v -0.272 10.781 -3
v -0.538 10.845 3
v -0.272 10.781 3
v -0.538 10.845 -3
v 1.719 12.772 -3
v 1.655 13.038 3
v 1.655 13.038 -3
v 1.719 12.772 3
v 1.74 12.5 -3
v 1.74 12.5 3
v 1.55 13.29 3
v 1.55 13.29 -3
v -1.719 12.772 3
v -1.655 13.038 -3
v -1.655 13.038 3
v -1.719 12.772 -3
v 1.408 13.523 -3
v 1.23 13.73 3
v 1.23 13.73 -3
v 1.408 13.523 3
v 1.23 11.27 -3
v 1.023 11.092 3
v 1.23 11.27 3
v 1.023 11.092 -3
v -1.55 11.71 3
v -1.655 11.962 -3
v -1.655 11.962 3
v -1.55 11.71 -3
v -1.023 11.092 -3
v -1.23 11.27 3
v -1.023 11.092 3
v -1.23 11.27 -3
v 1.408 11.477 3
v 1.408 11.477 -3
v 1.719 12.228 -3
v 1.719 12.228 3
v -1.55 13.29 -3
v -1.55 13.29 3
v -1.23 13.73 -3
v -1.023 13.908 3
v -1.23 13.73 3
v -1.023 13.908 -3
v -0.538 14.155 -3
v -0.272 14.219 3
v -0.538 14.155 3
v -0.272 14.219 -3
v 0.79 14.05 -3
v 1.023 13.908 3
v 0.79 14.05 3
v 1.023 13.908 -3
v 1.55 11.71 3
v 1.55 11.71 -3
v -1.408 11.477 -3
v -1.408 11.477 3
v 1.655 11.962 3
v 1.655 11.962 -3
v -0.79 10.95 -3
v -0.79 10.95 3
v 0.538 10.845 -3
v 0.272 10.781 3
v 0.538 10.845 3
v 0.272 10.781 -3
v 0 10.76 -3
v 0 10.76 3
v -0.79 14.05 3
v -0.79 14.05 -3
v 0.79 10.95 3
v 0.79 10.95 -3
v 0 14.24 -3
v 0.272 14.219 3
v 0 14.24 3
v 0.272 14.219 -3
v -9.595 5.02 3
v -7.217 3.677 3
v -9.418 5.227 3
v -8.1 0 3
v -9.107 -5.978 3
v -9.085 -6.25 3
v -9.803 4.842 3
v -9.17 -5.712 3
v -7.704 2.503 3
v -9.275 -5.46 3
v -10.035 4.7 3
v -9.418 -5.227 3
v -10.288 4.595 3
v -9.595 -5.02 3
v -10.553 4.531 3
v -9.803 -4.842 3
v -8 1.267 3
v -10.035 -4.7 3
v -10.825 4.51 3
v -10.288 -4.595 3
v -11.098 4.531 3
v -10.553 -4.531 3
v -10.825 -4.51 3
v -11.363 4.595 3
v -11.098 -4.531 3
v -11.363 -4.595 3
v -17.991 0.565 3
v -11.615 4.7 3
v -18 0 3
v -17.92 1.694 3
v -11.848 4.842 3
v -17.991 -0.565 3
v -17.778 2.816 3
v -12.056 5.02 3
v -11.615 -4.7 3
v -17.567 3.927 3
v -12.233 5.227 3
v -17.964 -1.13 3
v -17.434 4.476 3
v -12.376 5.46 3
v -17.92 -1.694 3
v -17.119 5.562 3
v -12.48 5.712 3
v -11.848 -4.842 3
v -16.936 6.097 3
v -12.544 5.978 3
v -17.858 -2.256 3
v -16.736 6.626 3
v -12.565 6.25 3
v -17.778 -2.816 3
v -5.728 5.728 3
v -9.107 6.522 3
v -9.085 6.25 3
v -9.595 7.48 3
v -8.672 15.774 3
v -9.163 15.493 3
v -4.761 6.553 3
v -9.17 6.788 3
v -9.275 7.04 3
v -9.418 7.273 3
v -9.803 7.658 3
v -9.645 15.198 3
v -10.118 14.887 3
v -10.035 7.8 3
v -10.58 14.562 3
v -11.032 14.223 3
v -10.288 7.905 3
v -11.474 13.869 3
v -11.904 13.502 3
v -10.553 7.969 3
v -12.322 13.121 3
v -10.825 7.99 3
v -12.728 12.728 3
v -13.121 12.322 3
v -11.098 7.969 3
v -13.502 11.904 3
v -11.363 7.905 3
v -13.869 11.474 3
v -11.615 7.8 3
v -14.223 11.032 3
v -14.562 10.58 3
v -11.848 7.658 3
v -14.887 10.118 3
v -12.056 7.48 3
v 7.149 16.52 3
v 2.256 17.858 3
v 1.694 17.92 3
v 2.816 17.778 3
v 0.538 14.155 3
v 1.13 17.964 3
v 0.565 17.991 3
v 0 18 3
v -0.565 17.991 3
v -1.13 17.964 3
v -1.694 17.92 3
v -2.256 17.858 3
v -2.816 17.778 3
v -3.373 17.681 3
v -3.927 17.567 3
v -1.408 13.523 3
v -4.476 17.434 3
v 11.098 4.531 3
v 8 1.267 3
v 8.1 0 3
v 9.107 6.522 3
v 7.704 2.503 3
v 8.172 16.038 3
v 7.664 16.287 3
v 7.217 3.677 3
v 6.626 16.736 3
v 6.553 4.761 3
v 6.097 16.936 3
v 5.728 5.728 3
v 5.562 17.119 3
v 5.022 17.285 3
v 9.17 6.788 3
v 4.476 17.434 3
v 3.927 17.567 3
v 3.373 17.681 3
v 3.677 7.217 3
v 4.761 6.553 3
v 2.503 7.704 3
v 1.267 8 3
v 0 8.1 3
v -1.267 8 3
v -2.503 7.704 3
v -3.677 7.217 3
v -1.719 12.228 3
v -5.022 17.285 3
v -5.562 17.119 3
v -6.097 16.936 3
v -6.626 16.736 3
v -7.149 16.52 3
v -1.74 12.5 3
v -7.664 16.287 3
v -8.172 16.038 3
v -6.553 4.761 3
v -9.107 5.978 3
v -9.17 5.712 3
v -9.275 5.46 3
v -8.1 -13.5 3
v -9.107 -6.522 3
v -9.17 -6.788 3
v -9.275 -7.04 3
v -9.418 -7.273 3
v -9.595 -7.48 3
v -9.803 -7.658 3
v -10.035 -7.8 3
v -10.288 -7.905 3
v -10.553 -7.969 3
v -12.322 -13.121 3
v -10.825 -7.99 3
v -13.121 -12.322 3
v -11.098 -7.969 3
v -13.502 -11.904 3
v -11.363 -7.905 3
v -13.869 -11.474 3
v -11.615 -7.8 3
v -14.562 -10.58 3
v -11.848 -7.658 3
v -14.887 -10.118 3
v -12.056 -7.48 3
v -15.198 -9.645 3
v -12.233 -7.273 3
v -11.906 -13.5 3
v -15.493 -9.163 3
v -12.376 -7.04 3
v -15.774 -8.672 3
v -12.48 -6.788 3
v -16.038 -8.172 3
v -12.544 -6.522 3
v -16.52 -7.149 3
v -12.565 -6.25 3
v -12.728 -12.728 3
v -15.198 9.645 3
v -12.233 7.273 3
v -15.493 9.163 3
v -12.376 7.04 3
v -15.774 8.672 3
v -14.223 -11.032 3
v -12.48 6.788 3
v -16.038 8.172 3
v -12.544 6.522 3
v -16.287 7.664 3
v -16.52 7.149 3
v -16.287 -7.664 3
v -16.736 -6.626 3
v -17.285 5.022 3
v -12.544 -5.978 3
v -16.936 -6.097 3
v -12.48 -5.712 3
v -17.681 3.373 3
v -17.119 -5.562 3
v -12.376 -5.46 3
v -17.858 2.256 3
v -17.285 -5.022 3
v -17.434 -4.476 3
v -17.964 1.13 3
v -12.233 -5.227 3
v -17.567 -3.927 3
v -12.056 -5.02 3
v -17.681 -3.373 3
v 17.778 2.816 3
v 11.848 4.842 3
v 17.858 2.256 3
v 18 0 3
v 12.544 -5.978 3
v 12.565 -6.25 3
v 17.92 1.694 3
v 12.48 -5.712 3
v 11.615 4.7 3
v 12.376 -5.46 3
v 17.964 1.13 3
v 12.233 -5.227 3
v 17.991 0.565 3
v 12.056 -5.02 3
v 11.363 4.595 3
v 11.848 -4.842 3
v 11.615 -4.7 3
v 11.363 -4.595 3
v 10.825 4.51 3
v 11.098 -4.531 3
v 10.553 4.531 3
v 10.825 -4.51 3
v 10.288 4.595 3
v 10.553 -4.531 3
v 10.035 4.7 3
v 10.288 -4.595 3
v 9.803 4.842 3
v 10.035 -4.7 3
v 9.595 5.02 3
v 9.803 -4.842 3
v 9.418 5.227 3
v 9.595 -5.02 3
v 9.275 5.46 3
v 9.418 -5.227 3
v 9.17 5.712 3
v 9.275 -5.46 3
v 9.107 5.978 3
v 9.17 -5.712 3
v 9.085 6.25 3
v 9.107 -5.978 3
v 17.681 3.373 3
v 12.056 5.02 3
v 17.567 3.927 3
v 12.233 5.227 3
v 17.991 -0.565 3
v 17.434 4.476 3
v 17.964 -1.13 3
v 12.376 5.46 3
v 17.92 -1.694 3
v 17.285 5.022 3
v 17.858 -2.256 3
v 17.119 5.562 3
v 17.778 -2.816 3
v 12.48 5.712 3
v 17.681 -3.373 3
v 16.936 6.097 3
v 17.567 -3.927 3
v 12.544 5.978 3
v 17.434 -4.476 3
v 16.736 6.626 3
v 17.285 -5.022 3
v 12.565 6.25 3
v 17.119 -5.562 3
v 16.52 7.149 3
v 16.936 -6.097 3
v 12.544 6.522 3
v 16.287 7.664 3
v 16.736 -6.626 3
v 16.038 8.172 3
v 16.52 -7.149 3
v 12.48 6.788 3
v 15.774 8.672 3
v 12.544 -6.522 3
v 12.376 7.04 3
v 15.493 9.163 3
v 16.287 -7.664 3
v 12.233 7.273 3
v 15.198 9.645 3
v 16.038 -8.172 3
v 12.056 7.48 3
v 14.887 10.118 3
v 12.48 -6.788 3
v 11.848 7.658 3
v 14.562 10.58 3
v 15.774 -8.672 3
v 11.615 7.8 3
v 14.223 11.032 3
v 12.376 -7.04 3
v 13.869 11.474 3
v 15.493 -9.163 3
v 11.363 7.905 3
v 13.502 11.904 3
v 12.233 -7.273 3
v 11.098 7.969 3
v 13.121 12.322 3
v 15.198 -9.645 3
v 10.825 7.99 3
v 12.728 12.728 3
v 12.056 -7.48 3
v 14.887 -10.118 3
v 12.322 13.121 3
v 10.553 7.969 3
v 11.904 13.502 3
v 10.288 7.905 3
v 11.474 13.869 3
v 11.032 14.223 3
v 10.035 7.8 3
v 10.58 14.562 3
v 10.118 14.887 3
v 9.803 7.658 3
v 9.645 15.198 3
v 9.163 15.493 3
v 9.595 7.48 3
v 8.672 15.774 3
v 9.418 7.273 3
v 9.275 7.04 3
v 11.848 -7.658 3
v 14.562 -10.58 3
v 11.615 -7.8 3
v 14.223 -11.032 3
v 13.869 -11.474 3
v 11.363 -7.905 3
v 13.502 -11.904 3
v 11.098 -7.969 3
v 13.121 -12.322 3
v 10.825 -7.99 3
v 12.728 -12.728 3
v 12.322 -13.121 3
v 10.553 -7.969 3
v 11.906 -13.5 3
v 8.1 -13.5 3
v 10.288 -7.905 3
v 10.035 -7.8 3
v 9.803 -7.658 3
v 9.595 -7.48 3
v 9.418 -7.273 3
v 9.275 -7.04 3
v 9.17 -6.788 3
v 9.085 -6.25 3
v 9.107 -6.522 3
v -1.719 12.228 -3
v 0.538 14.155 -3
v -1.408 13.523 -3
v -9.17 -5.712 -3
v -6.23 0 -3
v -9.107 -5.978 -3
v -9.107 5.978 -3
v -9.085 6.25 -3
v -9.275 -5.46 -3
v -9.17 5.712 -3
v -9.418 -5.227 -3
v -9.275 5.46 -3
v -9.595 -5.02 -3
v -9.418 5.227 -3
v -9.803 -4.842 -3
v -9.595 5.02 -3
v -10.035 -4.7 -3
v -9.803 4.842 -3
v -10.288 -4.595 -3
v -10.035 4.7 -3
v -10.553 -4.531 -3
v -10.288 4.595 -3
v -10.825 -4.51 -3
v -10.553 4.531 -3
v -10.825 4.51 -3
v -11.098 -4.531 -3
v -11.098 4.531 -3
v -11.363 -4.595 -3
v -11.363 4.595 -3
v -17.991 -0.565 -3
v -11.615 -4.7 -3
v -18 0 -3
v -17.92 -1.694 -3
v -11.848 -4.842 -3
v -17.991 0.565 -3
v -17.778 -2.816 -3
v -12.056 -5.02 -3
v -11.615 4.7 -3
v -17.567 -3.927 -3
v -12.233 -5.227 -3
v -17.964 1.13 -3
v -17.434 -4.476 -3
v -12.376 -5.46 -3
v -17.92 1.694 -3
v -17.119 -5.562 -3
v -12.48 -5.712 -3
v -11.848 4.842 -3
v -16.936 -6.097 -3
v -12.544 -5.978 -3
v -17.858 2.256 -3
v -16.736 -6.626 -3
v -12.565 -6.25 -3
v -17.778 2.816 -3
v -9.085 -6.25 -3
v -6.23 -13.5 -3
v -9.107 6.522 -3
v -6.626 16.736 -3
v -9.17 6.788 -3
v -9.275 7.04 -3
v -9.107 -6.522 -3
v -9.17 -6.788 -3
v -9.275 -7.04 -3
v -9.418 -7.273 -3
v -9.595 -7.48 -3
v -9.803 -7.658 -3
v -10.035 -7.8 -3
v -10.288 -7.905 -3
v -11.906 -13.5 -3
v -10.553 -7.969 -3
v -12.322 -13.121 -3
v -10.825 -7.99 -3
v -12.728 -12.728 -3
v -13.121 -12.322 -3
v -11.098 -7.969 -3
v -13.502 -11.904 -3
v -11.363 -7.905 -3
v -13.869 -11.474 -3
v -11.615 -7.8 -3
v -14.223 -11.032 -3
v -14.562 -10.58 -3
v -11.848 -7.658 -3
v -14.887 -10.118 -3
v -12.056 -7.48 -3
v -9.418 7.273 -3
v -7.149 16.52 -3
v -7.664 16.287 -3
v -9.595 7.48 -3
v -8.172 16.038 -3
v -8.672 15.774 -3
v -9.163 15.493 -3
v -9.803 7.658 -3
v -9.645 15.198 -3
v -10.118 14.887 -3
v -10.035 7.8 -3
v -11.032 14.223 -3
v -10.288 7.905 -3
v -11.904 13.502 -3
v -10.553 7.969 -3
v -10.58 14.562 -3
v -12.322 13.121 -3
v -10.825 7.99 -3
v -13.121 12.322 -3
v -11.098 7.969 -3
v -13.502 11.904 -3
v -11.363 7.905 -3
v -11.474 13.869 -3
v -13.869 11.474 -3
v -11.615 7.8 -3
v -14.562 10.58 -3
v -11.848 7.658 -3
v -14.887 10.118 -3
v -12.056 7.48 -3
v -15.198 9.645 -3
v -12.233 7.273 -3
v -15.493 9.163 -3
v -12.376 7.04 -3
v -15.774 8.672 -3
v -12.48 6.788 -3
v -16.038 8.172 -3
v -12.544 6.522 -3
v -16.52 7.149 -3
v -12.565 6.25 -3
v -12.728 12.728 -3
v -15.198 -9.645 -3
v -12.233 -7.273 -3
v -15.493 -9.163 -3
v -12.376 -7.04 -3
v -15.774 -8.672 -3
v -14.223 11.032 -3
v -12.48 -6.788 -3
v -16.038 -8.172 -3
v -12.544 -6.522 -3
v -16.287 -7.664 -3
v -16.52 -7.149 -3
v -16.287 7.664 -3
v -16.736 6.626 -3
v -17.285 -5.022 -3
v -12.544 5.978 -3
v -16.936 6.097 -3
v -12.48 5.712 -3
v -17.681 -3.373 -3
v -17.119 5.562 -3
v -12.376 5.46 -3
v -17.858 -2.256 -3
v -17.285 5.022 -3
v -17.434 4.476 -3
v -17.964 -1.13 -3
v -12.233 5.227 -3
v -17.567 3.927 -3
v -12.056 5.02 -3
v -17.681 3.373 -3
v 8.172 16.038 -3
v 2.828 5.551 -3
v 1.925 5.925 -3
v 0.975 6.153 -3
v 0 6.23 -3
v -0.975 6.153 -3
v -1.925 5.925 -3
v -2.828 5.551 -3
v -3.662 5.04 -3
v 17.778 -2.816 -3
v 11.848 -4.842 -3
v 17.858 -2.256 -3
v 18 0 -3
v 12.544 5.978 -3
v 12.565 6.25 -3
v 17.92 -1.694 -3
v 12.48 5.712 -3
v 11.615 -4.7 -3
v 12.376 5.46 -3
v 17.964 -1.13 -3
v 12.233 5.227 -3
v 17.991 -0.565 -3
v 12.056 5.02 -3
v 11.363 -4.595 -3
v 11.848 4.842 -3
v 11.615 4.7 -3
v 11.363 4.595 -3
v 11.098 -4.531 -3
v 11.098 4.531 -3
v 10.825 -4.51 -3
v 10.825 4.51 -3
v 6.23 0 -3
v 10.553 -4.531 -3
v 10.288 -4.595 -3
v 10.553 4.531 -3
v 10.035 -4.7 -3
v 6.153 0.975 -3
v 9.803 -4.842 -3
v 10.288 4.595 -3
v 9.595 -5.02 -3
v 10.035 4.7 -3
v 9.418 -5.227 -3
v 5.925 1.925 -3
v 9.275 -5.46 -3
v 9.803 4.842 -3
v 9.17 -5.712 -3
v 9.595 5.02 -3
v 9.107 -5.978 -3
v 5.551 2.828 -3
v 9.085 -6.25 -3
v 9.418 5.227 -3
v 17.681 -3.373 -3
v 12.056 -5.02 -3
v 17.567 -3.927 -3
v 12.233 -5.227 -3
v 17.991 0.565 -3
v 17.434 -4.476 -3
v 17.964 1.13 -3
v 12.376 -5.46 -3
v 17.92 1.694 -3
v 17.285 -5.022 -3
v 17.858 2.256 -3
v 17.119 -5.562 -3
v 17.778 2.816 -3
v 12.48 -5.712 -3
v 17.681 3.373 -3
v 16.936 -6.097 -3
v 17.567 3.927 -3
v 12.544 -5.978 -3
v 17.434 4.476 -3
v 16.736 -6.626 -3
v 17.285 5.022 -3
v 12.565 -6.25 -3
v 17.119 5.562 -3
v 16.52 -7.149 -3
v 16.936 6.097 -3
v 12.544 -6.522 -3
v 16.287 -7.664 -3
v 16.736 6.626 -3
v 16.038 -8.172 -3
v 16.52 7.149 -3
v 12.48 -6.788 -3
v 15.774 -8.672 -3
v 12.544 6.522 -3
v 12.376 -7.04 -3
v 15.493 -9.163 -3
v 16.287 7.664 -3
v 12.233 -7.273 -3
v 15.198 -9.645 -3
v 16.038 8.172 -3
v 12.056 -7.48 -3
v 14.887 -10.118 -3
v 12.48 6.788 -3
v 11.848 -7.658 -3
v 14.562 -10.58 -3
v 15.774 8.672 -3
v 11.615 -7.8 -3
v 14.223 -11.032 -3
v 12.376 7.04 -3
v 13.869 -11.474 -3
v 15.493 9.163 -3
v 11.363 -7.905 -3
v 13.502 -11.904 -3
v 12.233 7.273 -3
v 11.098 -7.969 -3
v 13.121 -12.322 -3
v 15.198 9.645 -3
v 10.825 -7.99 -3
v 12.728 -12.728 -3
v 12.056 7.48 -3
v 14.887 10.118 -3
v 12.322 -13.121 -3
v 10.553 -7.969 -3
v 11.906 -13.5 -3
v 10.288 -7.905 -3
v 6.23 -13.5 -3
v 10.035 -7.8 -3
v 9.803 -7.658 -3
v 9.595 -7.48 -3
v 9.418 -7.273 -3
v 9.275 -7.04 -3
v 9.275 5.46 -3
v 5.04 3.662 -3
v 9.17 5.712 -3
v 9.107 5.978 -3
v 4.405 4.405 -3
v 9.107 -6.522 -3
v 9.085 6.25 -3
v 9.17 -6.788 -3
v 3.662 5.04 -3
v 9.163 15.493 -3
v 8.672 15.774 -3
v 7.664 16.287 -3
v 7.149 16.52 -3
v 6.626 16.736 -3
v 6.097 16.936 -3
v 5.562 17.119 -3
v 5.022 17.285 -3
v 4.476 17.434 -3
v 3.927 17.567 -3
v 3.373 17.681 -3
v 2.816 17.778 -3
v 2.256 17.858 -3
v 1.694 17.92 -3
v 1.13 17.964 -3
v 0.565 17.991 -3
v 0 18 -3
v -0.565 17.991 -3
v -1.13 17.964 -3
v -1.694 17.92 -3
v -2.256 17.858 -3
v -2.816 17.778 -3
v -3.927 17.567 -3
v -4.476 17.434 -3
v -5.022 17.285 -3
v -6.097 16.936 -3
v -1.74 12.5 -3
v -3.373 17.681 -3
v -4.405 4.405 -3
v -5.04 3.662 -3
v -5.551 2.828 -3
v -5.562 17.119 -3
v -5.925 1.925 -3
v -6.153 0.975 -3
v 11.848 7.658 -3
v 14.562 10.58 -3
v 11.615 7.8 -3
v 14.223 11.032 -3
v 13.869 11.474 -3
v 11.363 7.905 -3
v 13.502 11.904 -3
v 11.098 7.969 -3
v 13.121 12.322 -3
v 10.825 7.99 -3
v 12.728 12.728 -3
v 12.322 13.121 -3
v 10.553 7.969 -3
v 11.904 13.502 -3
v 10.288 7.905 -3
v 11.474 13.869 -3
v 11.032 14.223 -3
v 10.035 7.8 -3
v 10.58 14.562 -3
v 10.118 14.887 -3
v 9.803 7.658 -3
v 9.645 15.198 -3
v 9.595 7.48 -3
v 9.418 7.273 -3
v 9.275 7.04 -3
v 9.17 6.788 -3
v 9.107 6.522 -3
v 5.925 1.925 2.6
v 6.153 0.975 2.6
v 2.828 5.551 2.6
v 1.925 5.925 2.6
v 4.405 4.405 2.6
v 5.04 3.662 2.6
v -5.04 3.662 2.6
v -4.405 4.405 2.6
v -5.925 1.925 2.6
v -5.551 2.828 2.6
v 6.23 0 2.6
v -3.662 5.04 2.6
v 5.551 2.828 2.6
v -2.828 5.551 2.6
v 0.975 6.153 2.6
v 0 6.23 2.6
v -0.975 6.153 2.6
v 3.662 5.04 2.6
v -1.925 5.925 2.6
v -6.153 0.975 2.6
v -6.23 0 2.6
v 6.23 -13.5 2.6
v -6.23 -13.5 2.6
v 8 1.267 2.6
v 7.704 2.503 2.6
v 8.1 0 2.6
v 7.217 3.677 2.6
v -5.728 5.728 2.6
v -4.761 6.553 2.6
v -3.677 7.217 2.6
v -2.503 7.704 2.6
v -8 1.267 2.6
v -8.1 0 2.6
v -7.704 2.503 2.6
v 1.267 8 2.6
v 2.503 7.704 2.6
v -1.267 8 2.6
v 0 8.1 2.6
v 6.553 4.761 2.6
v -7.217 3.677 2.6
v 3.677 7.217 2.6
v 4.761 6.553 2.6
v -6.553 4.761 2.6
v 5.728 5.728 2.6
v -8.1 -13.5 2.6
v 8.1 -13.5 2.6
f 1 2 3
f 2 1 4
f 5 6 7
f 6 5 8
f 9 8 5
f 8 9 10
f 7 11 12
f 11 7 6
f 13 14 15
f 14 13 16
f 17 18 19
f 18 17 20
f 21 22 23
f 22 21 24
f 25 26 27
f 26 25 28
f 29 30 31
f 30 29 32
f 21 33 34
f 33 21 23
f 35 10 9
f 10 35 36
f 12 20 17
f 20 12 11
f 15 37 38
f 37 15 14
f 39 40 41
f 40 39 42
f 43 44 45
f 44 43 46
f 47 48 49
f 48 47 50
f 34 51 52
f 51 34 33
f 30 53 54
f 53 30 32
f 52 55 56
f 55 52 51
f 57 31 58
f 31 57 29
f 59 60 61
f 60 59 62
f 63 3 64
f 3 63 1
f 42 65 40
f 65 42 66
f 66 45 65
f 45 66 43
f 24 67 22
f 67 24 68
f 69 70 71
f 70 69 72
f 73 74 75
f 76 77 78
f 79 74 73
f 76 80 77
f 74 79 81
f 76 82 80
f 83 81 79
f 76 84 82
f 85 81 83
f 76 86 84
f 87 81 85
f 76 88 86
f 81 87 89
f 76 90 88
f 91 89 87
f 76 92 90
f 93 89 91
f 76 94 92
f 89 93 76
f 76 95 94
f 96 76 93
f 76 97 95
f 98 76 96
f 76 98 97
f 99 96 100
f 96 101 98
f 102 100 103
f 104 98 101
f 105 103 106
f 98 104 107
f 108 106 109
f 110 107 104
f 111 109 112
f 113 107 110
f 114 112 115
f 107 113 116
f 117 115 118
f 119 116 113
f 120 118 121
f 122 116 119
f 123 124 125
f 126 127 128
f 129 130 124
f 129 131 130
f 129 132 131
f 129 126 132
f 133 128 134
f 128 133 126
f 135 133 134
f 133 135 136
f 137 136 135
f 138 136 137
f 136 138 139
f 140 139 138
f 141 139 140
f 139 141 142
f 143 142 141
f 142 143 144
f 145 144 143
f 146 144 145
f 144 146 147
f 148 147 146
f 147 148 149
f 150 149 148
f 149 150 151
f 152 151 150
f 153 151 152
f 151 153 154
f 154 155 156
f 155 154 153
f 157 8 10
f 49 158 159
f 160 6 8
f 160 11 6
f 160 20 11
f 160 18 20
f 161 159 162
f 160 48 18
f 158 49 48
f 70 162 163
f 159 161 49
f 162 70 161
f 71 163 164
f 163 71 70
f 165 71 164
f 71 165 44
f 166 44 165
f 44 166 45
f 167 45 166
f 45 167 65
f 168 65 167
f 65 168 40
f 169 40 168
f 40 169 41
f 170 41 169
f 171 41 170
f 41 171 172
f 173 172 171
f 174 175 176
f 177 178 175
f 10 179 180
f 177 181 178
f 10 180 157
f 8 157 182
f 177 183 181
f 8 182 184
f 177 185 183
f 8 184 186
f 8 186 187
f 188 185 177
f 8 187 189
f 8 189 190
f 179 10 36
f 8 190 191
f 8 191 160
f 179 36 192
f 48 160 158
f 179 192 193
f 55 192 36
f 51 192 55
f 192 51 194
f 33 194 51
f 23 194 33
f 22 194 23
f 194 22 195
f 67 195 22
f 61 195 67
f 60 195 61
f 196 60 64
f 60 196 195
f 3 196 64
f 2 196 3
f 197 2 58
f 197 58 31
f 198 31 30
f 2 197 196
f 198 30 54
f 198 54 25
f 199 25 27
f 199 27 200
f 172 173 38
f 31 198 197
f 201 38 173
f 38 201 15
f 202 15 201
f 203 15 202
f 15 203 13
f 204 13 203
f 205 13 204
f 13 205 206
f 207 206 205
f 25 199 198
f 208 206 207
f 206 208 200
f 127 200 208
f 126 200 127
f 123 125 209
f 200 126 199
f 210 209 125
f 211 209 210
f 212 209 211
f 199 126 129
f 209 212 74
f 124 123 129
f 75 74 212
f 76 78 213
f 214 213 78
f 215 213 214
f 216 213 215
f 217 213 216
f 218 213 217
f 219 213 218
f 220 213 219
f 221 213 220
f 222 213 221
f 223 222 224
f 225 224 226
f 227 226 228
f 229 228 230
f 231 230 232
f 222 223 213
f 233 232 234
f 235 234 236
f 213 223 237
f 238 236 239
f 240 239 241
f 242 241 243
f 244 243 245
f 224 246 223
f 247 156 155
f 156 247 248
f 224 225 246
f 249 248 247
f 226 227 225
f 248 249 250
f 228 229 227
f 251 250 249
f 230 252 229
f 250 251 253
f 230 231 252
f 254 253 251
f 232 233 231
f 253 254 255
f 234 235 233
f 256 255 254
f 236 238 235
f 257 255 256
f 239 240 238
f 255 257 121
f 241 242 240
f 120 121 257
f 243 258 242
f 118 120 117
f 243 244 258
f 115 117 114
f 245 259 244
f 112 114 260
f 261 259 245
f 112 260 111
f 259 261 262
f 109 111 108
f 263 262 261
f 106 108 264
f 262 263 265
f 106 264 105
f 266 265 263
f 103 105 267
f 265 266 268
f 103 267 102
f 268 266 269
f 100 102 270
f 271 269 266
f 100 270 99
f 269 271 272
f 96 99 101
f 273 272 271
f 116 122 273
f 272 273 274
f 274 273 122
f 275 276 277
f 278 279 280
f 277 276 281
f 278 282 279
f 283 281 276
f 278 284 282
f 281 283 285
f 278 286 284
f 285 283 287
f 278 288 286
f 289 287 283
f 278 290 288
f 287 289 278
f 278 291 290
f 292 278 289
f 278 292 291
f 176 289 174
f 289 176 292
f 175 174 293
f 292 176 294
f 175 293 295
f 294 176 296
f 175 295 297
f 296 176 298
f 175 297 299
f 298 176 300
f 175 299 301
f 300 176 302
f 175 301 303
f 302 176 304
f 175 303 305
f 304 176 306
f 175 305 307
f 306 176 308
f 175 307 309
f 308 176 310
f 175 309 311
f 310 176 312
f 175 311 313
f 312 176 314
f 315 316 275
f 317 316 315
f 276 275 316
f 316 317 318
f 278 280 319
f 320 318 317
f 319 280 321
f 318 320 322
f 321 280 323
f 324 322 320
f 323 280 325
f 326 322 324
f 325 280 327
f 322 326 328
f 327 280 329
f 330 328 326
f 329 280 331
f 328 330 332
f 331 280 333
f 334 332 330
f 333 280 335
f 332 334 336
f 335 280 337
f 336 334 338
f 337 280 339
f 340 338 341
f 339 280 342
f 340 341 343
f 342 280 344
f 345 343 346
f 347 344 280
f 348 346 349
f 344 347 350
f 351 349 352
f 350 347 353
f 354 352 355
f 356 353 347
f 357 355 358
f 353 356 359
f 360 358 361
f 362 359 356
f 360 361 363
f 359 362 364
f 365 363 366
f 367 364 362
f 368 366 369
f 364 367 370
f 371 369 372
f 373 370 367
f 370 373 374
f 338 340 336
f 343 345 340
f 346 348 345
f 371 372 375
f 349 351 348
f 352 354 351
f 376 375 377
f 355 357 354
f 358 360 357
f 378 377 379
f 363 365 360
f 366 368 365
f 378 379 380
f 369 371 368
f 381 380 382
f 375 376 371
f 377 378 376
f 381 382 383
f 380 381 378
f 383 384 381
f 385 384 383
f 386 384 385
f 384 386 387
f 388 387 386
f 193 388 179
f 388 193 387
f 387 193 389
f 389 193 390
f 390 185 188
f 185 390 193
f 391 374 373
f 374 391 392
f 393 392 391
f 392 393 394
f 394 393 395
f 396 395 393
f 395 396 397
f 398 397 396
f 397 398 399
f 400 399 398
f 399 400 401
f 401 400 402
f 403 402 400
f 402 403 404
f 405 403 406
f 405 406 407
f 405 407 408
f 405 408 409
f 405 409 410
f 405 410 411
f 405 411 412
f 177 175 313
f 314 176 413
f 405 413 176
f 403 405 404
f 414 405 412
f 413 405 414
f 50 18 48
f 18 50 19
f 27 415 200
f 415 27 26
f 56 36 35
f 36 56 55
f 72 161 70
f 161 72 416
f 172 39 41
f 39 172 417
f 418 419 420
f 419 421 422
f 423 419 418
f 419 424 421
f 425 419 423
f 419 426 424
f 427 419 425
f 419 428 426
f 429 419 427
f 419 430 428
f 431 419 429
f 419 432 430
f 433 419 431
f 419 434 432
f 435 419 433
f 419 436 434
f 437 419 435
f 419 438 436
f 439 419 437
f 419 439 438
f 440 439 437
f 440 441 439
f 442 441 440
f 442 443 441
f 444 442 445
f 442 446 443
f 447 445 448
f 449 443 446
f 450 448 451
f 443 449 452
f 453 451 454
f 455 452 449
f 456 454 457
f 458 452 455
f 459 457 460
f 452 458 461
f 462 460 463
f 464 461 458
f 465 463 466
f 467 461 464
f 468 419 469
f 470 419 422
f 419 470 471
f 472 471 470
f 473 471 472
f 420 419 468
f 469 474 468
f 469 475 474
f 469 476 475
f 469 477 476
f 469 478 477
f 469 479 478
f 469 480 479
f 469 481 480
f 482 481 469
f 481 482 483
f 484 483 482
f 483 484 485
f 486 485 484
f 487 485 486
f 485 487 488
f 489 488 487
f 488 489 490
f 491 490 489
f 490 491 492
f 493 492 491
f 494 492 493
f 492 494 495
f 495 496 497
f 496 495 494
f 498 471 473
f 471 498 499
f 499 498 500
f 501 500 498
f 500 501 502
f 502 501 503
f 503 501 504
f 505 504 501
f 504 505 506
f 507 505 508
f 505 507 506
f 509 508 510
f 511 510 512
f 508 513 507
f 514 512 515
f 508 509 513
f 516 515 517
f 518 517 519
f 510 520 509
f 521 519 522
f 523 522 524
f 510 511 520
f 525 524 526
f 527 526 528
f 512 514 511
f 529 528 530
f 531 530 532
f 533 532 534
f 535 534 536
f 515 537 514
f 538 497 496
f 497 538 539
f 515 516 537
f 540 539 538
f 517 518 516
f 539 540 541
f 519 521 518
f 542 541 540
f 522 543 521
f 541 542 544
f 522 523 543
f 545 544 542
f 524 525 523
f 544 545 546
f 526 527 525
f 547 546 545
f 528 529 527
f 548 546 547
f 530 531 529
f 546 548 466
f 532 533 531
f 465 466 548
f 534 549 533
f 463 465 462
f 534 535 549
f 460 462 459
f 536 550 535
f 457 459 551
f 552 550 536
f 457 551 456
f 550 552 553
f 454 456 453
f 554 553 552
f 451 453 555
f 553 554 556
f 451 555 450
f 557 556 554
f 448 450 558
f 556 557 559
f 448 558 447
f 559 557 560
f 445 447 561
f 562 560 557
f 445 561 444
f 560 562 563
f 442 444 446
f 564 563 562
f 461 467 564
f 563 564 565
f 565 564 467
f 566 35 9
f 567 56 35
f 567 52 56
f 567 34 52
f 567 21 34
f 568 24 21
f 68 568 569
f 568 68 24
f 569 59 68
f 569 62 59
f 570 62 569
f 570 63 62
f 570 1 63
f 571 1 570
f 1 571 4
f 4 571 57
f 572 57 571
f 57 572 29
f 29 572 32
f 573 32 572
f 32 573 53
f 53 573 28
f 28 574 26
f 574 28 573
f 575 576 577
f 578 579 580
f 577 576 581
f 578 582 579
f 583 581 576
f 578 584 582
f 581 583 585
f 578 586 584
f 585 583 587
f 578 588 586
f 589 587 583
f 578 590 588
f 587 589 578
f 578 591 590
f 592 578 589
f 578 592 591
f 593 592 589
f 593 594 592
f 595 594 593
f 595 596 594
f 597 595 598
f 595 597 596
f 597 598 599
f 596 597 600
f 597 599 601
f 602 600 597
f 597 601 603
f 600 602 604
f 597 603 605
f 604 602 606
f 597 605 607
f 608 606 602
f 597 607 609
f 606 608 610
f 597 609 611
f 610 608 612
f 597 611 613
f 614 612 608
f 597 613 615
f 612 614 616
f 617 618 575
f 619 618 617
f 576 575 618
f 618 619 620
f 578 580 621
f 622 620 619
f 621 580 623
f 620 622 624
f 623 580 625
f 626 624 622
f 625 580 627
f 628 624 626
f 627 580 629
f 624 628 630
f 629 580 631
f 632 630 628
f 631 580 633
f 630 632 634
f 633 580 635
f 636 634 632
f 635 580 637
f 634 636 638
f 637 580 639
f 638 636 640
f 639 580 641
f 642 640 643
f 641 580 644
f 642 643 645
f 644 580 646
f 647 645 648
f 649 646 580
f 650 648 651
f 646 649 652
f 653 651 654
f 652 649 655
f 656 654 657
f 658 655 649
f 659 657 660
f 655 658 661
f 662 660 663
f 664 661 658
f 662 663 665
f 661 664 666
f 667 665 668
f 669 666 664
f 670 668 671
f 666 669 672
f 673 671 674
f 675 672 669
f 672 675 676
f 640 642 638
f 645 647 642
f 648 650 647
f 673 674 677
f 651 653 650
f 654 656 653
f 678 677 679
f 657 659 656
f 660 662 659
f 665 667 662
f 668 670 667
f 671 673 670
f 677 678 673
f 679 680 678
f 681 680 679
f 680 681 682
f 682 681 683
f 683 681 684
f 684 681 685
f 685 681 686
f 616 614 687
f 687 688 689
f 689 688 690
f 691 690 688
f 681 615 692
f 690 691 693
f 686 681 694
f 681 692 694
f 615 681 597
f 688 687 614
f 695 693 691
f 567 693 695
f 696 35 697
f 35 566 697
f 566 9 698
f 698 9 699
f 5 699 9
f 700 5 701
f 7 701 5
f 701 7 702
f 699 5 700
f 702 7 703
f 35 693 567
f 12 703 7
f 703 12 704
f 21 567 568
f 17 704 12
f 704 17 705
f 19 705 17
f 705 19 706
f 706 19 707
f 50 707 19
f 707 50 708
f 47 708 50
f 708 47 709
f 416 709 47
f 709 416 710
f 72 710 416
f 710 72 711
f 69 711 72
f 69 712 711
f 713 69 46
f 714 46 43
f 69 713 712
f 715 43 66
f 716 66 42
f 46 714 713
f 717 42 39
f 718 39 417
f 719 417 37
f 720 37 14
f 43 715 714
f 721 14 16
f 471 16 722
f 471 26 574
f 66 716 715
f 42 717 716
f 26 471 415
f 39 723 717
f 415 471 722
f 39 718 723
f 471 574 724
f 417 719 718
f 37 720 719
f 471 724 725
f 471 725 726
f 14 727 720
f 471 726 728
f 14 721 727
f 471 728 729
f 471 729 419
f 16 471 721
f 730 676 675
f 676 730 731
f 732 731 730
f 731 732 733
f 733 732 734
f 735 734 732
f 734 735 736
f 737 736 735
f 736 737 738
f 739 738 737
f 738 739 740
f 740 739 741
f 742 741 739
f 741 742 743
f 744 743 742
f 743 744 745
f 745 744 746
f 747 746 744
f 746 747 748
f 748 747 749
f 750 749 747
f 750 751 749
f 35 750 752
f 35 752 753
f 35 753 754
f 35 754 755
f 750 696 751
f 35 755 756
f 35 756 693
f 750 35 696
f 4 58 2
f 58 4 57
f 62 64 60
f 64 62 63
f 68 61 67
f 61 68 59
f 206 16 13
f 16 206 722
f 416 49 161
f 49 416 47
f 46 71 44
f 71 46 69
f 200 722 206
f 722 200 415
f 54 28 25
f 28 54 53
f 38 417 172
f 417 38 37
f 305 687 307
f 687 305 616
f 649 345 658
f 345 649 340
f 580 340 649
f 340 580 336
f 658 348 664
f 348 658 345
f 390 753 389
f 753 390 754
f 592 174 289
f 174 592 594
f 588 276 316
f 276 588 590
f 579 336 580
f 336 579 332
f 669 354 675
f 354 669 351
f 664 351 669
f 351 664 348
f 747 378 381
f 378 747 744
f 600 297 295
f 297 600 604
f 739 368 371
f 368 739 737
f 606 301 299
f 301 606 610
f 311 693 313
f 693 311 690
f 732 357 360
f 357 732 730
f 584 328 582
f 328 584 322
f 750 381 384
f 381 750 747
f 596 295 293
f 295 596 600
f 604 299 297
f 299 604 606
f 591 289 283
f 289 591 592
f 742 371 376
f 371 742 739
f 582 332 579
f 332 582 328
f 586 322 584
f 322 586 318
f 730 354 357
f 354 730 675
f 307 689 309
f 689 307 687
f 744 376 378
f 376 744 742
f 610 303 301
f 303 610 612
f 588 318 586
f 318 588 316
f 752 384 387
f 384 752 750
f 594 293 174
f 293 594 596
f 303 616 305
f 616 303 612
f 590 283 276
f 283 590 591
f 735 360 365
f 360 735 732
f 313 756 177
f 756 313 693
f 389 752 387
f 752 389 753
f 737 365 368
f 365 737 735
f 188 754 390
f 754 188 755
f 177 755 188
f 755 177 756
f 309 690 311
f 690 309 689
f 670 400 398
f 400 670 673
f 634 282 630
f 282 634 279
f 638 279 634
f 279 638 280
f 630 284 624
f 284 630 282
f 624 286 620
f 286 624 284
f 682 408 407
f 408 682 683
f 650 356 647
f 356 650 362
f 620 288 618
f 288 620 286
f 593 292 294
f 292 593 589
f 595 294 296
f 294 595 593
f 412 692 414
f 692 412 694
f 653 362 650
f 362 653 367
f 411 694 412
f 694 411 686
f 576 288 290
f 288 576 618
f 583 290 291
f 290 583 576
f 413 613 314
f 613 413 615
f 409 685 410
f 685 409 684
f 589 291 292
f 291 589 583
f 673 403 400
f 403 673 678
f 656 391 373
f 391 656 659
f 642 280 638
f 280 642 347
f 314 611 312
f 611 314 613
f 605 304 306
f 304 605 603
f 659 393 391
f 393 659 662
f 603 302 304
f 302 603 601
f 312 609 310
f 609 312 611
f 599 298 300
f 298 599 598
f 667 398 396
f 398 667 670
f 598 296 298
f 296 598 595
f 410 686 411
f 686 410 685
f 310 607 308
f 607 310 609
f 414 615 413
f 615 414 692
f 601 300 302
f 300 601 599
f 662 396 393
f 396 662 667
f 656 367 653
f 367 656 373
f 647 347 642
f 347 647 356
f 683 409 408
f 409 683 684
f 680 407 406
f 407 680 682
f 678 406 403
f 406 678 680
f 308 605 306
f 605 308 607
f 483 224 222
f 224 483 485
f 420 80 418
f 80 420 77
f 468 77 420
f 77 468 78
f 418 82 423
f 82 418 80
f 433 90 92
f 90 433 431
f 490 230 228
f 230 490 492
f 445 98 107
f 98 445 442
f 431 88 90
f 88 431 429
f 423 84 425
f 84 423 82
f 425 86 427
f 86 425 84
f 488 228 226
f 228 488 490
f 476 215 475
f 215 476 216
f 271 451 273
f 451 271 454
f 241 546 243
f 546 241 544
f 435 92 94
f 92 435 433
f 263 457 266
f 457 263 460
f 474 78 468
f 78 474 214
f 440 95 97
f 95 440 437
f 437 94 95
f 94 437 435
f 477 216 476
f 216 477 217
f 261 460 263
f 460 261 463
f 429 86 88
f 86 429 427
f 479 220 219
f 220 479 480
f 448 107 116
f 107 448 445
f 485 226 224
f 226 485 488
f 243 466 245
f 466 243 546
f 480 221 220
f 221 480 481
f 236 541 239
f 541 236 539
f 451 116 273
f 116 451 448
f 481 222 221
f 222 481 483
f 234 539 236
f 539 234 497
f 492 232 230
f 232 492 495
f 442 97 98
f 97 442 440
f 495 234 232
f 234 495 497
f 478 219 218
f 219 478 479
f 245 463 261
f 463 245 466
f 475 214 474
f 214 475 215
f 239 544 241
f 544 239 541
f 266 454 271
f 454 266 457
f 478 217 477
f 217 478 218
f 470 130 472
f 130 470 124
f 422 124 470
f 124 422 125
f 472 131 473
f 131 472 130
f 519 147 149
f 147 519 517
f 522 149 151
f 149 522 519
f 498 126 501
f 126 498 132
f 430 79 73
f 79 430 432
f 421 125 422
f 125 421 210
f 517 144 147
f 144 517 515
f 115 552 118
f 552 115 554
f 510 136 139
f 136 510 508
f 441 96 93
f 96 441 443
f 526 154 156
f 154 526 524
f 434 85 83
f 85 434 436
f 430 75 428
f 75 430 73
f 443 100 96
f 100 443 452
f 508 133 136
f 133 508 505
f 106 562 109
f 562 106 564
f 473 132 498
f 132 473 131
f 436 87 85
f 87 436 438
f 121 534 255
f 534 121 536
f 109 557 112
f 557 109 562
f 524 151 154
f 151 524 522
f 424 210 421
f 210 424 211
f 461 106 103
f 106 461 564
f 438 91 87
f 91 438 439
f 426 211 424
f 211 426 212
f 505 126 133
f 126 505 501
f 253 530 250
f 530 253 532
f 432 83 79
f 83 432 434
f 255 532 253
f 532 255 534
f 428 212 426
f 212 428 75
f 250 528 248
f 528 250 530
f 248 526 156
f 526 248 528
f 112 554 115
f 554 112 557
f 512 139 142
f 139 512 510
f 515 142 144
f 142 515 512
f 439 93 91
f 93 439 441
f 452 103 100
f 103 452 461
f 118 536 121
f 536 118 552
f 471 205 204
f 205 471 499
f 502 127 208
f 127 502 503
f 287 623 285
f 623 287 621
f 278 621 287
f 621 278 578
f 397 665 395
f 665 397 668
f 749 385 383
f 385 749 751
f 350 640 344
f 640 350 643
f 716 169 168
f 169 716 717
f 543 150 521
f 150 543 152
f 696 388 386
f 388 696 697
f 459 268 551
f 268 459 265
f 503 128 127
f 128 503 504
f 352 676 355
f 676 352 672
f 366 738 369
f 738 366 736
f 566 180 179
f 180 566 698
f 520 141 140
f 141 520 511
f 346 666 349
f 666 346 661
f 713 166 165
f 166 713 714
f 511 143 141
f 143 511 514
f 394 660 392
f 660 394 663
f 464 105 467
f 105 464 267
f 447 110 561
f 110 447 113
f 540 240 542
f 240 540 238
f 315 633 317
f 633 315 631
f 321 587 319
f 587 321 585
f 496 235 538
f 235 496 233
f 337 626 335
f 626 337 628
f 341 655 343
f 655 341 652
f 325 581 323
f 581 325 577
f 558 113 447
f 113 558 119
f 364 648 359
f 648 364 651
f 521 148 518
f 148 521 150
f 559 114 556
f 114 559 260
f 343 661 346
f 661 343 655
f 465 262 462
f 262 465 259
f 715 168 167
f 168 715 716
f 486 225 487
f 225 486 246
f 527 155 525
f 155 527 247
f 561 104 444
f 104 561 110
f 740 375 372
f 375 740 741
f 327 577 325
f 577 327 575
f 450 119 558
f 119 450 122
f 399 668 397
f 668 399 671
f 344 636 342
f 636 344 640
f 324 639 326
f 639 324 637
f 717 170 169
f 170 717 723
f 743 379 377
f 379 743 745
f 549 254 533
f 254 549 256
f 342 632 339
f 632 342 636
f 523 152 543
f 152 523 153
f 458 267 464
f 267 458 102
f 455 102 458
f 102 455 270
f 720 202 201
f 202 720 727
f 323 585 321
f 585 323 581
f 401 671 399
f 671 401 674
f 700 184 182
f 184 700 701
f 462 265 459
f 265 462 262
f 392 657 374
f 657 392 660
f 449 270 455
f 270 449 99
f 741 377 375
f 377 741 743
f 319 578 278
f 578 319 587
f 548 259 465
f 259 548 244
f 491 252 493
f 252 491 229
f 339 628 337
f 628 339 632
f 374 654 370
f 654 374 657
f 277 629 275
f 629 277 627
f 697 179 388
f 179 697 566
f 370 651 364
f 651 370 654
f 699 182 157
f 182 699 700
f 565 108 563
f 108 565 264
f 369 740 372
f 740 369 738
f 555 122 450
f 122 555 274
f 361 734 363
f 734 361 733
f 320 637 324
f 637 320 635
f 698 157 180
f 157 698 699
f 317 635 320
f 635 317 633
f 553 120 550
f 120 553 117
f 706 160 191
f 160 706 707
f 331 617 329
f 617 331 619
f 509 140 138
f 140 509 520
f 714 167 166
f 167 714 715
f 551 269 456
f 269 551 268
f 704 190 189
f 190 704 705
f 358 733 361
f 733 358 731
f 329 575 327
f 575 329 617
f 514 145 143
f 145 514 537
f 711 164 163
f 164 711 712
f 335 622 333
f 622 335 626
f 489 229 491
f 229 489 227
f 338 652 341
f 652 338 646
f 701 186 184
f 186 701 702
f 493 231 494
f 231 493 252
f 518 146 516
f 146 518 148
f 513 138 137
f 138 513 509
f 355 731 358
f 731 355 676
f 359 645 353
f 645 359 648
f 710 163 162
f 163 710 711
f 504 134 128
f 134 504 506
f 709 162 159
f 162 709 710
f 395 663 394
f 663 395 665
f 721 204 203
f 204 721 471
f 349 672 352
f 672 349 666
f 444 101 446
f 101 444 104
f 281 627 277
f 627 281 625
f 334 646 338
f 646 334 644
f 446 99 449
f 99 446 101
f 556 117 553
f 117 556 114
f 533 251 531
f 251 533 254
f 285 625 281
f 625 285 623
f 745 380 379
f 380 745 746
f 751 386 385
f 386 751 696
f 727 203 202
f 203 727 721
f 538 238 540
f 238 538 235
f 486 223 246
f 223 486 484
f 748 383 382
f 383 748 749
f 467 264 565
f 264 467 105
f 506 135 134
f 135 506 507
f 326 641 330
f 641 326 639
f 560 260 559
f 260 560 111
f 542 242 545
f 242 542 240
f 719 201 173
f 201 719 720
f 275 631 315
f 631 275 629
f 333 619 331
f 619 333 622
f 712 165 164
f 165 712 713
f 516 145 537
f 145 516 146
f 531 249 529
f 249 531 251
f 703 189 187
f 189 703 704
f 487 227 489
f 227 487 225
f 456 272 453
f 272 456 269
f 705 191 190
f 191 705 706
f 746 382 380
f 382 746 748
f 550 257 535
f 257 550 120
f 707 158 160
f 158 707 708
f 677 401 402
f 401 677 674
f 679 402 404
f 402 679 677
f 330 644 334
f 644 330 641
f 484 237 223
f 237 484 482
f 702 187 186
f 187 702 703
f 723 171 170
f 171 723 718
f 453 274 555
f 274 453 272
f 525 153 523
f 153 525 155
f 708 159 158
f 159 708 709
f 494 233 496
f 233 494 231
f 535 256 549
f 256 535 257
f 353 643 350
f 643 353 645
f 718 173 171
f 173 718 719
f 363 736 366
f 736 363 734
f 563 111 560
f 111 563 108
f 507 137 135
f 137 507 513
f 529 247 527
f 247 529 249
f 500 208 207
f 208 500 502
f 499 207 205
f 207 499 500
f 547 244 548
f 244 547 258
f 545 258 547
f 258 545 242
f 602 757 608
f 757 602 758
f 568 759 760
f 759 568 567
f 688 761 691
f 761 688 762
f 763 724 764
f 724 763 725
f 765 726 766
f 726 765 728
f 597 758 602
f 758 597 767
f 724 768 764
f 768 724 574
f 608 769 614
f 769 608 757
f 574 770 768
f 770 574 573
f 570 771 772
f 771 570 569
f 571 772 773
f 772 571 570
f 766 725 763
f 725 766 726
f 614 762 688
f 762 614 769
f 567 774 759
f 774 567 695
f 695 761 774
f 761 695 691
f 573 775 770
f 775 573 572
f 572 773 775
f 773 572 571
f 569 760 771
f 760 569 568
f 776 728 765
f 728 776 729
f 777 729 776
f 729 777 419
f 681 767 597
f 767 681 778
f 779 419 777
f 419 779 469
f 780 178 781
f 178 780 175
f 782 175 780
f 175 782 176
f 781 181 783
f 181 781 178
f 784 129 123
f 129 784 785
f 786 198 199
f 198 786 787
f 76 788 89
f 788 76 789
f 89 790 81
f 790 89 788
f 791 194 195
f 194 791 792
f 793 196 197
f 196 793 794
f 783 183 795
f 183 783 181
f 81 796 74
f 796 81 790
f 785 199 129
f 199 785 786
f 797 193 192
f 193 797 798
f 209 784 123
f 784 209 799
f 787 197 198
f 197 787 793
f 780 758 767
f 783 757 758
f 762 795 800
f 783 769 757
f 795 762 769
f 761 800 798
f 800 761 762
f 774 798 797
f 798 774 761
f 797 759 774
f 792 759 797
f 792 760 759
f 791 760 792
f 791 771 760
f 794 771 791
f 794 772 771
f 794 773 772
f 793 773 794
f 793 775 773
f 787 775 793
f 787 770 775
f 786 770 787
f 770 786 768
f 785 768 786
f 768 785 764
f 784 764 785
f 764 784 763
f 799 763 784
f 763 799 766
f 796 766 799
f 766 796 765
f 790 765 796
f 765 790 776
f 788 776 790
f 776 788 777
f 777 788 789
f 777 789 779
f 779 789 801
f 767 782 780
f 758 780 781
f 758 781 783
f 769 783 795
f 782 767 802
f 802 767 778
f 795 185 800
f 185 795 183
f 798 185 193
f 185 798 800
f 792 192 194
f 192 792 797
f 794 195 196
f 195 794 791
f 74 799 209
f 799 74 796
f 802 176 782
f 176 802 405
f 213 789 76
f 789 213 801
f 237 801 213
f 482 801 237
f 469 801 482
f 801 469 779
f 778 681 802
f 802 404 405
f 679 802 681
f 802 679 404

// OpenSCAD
// file: configuration.scad
// Increase this if your slicer or printer make holes too tight.
extra_radius = 0.1;

// OD = outside diameter, corner to corner.
m3_nut_od = 6.1;
m3_nut_radius = m3_nut_od/2 + 0.2 + extra_radius;
m3_washer_radius = 3.5 + extra_radius;
m3_washer_height = 0.65;

// Major diameter of metric 3mm thread.
m3_head_height = 3;
m3_major = 2.88;
m3_radius = m3_major/2 + extra_radius;
m3_wide_radius = m3_major/2 + extra_radius + 0.2;

// NEMA17 stepper motors.
motor_shaft_diameter = 5;
motor_shaft_radius = motor_shaft_diameter/2 + extra_radius;

// Frame brackets. M3x8mm screws work best with 3.6 mm brackets.
thickness = 3.6;

// OpenBeam or Misumi. Currently only 15x15 mm, but there is a plan
// to make models more parametric and allow 20x20 mm in the future.
extrusion = 15;

// Placement for the NEMA17 stepper motors.
motor_offset = 44;
motor_length = 47;
// main file
include <configuration.scad>;

// Overall mount dimensions
mount_radius = 18;
mount_thickness = 6;

// Through holes
hole_radius = 12.5;

// Slot and lip for installation
slot_radius = 6.23;
lip_radius = 8.1;
lip_thickness = 0.4;

$fn = 40;

difference() {
  cylinder(r=mount_radius, h=mount_thickness, center=true, $fn=200);

  // Thru holes
  for (hole_angle = [0:60:360]) {
    translate([sin(hole_angle)*hole_radius,cos(hole_angle)*hole_radius,0]) cylinder(r=m3_wide_radius, h=mount_thickness, center=true);
  }

  // Thru slot
  cylinder(r=slot_radius, h=mount_thickness, center=true);
  translate([0, -mount_radius/2, 0]) cube([2*slot_radius, mount_radius, mount_thickness], center=true);

  // Lip 
  translate([0, 0, (mount_thickness-lip_thickness)/2]) 
	cylinder(r=lip_radius, h=lip_thickness, center=true);
  translate([0, -mount_radius/2, (mount_thickness-lip_thickness)/2]) 
	cube([2*lip_radius, mount_radius, lip_thickness], center=true);

  // Cut off the sharp edges at the front
  translate([0, -7/4*mount_radius, 0]) cube([2*mount_radius, 2*mount_radius, mount_thickness], center=true);
};
